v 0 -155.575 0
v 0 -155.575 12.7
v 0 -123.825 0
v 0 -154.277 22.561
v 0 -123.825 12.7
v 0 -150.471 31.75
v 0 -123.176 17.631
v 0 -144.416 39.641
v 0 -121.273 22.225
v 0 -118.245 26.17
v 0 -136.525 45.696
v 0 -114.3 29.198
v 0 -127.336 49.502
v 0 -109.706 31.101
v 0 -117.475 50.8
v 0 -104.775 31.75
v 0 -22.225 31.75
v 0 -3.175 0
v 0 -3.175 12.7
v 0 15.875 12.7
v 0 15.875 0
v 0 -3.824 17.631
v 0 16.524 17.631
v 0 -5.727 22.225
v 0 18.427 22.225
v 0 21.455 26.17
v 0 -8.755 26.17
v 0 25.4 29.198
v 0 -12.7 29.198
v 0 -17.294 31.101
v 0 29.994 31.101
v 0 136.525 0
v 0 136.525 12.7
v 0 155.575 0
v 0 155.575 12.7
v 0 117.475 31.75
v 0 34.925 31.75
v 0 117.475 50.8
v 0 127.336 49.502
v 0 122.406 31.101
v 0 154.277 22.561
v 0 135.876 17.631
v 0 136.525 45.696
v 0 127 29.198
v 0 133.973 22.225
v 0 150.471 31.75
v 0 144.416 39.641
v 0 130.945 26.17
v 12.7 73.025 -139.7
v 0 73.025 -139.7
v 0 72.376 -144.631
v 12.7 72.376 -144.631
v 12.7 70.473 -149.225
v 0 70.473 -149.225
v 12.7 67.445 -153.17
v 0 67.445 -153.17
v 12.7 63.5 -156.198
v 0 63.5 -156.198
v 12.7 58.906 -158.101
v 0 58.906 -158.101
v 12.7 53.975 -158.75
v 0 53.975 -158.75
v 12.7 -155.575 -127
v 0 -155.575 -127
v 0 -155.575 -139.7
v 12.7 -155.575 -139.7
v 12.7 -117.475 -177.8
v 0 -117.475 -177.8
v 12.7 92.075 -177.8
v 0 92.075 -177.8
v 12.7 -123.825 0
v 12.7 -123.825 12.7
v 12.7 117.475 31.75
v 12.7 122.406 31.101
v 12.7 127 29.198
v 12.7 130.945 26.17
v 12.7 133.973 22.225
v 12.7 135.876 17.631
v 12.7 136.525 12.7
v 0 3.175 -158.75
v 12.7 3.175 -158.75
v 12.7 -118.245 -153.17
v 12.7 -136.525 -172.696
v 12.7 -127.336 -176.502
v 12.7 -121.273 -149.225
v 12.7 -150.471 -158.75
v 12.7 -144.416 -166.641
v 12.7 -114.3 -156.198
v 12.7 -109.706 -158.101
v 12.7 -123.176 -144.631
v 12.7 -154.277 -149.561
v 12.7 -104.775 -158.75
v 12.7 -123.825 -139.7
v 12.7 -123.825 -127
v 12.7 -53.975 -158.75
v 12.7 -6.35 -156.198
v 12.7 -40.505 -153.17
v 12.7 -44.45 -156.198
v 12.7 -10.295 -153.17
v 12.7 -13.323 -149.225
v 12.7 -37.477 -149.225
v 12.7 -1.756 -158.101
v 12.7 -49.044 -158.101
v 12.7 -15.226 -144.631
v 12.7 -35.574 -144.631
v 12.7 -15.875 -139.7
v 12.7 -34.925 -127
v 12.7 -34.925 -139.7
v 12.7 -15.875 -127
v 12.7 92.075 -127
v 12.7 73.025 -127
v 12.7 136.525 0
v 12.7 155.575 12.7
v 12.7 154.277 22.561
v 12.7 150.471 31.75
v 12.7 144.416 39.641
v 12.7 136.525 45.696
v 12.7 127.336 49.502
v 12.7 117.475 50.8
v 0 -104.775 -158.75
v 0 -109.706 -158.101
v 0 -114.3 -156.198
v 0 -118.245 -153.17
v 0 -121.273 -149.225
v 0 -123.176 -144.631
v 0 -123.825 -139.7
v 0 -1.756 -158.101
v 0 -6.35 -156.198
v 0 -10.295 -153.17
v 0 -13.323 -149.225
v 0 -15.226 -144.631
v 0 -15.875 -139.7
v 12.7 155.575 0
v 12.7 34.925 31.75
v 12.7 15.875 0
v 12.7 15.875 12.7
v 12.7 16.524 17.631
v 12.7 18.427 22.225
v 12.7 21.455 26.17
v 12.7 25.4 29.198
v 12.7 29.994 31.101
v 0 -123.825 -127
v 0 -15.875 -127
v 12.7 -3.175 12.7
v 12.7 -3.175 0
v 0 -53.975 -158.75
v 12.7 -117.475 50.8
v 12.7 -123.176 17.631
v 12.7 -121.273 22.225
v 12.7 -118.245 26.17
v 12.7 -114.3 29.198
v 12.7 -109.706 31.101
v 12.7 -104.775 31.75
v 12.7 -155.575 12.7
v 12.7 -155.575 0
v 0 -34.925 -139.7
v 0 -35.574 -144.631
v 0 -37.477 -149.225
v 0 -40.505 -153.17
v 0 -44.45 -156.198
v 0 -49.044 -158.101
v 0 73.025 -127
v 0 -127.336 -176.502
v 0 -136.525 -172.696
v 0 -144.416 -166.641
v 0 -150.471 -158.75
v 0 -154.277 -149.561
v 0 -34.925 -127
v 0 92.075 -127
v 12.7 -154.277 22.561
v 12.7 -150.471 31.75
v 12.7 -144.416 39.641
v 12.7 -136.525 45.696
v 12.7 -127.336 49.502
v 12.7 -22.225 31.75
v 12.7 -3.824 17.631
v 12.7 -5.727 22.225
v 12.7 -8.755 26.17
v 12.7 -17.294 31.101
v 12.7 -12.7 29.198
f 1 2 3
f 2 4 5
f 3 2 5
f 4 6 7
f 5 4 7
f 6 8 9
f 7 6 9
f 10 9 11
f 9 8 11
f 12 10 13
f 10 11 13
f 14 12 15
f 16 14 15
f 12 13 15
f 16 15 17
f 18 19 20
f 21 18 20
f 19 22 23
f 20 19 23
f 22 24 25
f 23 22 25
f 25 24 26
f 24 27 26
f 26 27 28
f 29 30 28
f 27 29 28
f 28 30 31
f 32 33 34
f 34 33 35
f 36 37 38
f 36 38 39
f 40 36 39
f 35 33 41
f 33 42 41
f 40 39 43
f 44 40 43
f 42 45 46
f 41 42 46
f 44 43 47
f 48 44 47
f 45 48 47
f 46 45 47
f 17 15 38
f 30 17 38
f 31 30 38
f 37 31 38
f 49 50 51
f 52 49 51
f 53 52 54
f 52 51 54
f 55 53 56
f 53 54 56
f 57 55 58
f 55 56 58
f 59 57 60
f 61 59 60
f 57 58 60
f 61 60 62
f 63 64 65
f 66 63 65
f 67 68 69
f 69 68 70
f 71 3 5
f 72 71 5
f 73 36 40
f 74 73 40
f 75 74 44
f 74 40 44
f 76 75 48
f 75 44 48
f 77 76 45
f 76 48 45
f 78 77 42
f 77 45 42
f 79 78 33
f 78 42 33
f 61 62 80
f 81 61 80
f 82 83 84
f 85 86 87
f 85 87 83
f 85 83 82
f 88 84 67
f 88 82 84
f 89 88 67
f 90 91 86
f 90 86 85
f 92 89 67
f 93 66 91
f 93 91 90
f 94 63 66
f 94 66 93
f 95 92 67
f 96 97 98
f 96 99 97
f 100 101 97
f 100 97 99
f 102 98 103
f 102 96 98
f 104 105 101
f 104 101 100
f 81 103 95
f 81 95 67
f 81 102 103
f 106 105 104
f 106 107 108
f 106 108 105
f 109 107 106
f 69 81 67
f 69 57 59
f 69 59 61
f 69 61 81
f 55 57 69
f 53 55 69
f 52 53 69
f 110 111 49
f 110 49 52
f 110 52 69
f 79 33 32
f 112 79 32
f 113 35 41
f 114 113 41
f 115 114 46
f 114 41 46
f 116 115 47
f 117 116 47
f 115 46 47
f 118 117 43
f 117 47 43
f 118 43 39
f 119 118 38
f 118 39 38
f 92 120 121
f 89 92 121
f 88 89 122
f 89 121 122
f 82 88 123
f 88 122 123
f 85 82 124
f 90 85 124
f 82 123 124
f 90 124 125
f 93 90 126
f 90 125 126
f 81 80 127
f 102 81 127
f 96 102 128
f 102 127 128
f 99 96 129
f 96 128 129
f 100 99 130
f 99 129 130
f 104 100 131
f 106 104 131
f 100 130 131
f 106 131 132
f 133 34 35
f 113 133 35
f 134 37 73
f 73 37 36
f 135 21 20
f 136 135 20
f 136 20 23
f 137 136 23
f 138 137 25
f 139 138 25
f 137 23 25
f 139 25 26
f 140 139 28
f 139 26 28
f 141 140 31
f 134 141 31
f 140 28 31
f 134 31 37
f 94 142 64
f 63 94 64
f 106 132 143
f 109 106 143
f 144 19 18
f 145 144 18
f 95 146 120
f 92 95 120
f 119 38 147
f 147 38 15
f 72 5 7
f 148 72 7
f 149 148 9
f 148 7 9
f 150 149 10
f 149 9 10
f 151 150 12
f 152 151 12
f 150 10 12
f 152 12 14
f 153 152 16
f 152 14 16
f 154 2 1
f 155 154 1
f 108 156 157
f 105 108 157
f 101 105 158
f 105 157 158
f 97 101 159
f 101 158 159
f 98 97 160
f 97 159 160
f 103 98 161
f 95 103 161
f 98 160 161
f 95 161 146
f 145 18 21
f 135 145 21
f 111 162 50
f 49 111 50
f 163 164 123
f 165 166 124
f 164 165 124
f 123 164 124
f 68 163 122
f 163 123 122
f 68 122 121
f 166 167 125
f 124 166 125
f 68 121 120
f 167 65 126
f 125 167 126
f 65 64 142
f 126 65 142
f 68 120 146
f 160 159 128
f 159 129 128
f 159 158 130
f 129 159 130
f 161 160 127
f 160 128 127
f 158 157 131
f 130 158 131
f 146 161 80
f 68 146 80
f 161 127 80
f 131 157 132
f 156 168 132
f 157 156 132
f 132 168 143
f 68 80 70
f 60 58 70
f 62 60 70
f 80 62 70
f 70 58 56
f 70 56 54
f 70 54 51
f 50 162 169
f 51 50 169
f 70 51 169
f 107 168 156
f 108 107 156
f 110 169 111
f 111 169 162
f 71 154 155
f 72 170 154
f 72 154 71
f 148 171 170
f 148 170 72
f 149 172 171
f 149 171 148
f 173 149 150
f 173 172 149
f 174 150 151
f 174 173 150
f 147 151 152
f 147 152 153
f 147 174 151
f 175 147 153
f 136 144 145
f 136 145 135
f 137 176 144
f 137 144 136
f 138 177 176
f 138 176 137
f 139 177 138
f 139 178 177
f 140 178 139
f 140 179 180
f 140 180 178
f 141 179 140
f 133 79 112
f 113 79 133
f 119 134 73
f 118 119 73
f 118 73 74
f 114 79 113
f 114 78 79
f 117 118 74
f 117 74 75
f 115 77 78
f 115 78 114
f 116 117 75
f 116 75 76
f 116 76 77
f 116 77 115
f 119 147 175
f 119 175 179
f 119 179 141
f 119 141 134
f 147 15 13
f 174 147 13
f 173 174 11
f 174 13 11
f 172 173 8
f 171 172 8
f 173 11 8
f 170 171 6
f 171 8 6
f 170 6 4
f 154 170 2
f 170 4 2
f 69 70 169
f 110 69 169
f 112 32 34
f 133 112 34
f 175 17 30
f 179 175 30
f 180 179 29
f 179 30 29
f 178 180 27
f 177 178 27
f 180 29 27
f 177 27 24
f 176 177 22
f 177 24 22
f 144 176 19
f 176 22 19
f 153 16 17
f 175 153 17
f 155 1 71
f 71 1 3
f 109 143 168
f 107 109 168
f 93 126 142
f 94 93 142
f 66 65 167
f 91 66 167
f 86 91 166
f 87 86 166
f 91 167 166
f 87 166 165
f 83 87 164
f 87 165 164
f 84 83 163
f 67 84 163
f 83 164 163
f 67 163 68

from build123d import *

# Parameters (mm, degrees)
F1_DEPTH = 12.7
F2_DEPTH = 12.7


with BuildPart() as f1:
    # F0 (on Right) → F1 (new body)
    with BuildSketch(Plane.YZ):
        with BuildLine():
            Line((-155.575, 12.7), (-155.575, 0))
            Line((-155.575, 0), (-123.825, 0))
            Line((-123.825, 0), (-123.825, 12.7))
            ThreePointArc((-123.825, 12.7), (-118.245384, 26.170384), (-104.775, 31.75))
            Line((-104.775, 31.75), (-22.225, 31.75))
            ThreePointArc((-22.225, 31.75), (-8.754616, 26.170384), (-3.175, 12.7))
            Line((-3.175, 12.7), (-3.175, 0))
            Line((-3.175, 0), (15.875, 0))
            Line((15.875, 0), (15.875, 12.7))
            ThreePointArc((15.875, 12.7), (21.454616, 26.170384), (34.925, 31.75))
            Line((34.925, 31.75), (117.475, 31.75))
            ThreePointArc((117.475, 31.75), (130.945384, 26.170384), (136.525, 12.7))
            Line((136.525, 12.7), (136.525, 0))
            Line((136.525, 0), (155.575, 0))
            Line((155.575, 0), (155.575, 12.7))
            ThreePointArc((155.575, 12.7), (144.415768, 39.640768), (117.475, 50.8))
            Line((117.475, 50.8), (-117.475, 50.8))
            ThreePointArc((-117.475, 50.8), (-144.415768, 39.640768), (-155.575, 12.7))
        make_face()
    extrude(amount=F1_DEPTH)


with BuildPart() as f2:
    # F0 (on Right) → F2 (new body)
    with BuildSketch(Plane.YZ):
        with BuildLine():
            Line((-123.825, -127), (-155.575, -127))
            Line((-155.575, -127), (-155.575, -139.7))
            ThreePointArc((-155.575, -139.7), (-144.415768, -166.640768), (-117.475, -177.8))
            Line((-117.475, -177.8), (92.075, -177.8))
            Line((92.075, -177.8), (92.075, -127))
            Line((92.075, -127), (73.025, -127))
            Line((73.025, -127), (73.025, -139.7))
            ThreePointArc((73.025, -139.7), (67.445384, -153.170384), (53.975, -158.75))
            Line((53.975, -158.75), (3.175, -158.75))
            ThreePointArc((3.175, -158.75), (-10.295384, -153.170384), (-15.875, -139.7))
            Line((-15.875, -139.7), (-15.875, -127))
            Line((-15.875, -127), (-34.925, -127))
            Line((-34.925, -127), (-34.925, -139.7))
            ThreePointArc((-34.925, -139.7), (-40.504616, -153.170384), (-53.975, -158.75))
            Line((-53.975, -158.75), (-104.775, -158.75))
            ThreePointArc((-104.775, -158.75), (-118.245384, -153.170384), (-123.825, -139.7))
            Line((-123.825, -139.7), (-123.825, -127))
        make_face()
    extrude(amount=F2_DEPTH)


solid = Compound([f1.part, f2.part])
